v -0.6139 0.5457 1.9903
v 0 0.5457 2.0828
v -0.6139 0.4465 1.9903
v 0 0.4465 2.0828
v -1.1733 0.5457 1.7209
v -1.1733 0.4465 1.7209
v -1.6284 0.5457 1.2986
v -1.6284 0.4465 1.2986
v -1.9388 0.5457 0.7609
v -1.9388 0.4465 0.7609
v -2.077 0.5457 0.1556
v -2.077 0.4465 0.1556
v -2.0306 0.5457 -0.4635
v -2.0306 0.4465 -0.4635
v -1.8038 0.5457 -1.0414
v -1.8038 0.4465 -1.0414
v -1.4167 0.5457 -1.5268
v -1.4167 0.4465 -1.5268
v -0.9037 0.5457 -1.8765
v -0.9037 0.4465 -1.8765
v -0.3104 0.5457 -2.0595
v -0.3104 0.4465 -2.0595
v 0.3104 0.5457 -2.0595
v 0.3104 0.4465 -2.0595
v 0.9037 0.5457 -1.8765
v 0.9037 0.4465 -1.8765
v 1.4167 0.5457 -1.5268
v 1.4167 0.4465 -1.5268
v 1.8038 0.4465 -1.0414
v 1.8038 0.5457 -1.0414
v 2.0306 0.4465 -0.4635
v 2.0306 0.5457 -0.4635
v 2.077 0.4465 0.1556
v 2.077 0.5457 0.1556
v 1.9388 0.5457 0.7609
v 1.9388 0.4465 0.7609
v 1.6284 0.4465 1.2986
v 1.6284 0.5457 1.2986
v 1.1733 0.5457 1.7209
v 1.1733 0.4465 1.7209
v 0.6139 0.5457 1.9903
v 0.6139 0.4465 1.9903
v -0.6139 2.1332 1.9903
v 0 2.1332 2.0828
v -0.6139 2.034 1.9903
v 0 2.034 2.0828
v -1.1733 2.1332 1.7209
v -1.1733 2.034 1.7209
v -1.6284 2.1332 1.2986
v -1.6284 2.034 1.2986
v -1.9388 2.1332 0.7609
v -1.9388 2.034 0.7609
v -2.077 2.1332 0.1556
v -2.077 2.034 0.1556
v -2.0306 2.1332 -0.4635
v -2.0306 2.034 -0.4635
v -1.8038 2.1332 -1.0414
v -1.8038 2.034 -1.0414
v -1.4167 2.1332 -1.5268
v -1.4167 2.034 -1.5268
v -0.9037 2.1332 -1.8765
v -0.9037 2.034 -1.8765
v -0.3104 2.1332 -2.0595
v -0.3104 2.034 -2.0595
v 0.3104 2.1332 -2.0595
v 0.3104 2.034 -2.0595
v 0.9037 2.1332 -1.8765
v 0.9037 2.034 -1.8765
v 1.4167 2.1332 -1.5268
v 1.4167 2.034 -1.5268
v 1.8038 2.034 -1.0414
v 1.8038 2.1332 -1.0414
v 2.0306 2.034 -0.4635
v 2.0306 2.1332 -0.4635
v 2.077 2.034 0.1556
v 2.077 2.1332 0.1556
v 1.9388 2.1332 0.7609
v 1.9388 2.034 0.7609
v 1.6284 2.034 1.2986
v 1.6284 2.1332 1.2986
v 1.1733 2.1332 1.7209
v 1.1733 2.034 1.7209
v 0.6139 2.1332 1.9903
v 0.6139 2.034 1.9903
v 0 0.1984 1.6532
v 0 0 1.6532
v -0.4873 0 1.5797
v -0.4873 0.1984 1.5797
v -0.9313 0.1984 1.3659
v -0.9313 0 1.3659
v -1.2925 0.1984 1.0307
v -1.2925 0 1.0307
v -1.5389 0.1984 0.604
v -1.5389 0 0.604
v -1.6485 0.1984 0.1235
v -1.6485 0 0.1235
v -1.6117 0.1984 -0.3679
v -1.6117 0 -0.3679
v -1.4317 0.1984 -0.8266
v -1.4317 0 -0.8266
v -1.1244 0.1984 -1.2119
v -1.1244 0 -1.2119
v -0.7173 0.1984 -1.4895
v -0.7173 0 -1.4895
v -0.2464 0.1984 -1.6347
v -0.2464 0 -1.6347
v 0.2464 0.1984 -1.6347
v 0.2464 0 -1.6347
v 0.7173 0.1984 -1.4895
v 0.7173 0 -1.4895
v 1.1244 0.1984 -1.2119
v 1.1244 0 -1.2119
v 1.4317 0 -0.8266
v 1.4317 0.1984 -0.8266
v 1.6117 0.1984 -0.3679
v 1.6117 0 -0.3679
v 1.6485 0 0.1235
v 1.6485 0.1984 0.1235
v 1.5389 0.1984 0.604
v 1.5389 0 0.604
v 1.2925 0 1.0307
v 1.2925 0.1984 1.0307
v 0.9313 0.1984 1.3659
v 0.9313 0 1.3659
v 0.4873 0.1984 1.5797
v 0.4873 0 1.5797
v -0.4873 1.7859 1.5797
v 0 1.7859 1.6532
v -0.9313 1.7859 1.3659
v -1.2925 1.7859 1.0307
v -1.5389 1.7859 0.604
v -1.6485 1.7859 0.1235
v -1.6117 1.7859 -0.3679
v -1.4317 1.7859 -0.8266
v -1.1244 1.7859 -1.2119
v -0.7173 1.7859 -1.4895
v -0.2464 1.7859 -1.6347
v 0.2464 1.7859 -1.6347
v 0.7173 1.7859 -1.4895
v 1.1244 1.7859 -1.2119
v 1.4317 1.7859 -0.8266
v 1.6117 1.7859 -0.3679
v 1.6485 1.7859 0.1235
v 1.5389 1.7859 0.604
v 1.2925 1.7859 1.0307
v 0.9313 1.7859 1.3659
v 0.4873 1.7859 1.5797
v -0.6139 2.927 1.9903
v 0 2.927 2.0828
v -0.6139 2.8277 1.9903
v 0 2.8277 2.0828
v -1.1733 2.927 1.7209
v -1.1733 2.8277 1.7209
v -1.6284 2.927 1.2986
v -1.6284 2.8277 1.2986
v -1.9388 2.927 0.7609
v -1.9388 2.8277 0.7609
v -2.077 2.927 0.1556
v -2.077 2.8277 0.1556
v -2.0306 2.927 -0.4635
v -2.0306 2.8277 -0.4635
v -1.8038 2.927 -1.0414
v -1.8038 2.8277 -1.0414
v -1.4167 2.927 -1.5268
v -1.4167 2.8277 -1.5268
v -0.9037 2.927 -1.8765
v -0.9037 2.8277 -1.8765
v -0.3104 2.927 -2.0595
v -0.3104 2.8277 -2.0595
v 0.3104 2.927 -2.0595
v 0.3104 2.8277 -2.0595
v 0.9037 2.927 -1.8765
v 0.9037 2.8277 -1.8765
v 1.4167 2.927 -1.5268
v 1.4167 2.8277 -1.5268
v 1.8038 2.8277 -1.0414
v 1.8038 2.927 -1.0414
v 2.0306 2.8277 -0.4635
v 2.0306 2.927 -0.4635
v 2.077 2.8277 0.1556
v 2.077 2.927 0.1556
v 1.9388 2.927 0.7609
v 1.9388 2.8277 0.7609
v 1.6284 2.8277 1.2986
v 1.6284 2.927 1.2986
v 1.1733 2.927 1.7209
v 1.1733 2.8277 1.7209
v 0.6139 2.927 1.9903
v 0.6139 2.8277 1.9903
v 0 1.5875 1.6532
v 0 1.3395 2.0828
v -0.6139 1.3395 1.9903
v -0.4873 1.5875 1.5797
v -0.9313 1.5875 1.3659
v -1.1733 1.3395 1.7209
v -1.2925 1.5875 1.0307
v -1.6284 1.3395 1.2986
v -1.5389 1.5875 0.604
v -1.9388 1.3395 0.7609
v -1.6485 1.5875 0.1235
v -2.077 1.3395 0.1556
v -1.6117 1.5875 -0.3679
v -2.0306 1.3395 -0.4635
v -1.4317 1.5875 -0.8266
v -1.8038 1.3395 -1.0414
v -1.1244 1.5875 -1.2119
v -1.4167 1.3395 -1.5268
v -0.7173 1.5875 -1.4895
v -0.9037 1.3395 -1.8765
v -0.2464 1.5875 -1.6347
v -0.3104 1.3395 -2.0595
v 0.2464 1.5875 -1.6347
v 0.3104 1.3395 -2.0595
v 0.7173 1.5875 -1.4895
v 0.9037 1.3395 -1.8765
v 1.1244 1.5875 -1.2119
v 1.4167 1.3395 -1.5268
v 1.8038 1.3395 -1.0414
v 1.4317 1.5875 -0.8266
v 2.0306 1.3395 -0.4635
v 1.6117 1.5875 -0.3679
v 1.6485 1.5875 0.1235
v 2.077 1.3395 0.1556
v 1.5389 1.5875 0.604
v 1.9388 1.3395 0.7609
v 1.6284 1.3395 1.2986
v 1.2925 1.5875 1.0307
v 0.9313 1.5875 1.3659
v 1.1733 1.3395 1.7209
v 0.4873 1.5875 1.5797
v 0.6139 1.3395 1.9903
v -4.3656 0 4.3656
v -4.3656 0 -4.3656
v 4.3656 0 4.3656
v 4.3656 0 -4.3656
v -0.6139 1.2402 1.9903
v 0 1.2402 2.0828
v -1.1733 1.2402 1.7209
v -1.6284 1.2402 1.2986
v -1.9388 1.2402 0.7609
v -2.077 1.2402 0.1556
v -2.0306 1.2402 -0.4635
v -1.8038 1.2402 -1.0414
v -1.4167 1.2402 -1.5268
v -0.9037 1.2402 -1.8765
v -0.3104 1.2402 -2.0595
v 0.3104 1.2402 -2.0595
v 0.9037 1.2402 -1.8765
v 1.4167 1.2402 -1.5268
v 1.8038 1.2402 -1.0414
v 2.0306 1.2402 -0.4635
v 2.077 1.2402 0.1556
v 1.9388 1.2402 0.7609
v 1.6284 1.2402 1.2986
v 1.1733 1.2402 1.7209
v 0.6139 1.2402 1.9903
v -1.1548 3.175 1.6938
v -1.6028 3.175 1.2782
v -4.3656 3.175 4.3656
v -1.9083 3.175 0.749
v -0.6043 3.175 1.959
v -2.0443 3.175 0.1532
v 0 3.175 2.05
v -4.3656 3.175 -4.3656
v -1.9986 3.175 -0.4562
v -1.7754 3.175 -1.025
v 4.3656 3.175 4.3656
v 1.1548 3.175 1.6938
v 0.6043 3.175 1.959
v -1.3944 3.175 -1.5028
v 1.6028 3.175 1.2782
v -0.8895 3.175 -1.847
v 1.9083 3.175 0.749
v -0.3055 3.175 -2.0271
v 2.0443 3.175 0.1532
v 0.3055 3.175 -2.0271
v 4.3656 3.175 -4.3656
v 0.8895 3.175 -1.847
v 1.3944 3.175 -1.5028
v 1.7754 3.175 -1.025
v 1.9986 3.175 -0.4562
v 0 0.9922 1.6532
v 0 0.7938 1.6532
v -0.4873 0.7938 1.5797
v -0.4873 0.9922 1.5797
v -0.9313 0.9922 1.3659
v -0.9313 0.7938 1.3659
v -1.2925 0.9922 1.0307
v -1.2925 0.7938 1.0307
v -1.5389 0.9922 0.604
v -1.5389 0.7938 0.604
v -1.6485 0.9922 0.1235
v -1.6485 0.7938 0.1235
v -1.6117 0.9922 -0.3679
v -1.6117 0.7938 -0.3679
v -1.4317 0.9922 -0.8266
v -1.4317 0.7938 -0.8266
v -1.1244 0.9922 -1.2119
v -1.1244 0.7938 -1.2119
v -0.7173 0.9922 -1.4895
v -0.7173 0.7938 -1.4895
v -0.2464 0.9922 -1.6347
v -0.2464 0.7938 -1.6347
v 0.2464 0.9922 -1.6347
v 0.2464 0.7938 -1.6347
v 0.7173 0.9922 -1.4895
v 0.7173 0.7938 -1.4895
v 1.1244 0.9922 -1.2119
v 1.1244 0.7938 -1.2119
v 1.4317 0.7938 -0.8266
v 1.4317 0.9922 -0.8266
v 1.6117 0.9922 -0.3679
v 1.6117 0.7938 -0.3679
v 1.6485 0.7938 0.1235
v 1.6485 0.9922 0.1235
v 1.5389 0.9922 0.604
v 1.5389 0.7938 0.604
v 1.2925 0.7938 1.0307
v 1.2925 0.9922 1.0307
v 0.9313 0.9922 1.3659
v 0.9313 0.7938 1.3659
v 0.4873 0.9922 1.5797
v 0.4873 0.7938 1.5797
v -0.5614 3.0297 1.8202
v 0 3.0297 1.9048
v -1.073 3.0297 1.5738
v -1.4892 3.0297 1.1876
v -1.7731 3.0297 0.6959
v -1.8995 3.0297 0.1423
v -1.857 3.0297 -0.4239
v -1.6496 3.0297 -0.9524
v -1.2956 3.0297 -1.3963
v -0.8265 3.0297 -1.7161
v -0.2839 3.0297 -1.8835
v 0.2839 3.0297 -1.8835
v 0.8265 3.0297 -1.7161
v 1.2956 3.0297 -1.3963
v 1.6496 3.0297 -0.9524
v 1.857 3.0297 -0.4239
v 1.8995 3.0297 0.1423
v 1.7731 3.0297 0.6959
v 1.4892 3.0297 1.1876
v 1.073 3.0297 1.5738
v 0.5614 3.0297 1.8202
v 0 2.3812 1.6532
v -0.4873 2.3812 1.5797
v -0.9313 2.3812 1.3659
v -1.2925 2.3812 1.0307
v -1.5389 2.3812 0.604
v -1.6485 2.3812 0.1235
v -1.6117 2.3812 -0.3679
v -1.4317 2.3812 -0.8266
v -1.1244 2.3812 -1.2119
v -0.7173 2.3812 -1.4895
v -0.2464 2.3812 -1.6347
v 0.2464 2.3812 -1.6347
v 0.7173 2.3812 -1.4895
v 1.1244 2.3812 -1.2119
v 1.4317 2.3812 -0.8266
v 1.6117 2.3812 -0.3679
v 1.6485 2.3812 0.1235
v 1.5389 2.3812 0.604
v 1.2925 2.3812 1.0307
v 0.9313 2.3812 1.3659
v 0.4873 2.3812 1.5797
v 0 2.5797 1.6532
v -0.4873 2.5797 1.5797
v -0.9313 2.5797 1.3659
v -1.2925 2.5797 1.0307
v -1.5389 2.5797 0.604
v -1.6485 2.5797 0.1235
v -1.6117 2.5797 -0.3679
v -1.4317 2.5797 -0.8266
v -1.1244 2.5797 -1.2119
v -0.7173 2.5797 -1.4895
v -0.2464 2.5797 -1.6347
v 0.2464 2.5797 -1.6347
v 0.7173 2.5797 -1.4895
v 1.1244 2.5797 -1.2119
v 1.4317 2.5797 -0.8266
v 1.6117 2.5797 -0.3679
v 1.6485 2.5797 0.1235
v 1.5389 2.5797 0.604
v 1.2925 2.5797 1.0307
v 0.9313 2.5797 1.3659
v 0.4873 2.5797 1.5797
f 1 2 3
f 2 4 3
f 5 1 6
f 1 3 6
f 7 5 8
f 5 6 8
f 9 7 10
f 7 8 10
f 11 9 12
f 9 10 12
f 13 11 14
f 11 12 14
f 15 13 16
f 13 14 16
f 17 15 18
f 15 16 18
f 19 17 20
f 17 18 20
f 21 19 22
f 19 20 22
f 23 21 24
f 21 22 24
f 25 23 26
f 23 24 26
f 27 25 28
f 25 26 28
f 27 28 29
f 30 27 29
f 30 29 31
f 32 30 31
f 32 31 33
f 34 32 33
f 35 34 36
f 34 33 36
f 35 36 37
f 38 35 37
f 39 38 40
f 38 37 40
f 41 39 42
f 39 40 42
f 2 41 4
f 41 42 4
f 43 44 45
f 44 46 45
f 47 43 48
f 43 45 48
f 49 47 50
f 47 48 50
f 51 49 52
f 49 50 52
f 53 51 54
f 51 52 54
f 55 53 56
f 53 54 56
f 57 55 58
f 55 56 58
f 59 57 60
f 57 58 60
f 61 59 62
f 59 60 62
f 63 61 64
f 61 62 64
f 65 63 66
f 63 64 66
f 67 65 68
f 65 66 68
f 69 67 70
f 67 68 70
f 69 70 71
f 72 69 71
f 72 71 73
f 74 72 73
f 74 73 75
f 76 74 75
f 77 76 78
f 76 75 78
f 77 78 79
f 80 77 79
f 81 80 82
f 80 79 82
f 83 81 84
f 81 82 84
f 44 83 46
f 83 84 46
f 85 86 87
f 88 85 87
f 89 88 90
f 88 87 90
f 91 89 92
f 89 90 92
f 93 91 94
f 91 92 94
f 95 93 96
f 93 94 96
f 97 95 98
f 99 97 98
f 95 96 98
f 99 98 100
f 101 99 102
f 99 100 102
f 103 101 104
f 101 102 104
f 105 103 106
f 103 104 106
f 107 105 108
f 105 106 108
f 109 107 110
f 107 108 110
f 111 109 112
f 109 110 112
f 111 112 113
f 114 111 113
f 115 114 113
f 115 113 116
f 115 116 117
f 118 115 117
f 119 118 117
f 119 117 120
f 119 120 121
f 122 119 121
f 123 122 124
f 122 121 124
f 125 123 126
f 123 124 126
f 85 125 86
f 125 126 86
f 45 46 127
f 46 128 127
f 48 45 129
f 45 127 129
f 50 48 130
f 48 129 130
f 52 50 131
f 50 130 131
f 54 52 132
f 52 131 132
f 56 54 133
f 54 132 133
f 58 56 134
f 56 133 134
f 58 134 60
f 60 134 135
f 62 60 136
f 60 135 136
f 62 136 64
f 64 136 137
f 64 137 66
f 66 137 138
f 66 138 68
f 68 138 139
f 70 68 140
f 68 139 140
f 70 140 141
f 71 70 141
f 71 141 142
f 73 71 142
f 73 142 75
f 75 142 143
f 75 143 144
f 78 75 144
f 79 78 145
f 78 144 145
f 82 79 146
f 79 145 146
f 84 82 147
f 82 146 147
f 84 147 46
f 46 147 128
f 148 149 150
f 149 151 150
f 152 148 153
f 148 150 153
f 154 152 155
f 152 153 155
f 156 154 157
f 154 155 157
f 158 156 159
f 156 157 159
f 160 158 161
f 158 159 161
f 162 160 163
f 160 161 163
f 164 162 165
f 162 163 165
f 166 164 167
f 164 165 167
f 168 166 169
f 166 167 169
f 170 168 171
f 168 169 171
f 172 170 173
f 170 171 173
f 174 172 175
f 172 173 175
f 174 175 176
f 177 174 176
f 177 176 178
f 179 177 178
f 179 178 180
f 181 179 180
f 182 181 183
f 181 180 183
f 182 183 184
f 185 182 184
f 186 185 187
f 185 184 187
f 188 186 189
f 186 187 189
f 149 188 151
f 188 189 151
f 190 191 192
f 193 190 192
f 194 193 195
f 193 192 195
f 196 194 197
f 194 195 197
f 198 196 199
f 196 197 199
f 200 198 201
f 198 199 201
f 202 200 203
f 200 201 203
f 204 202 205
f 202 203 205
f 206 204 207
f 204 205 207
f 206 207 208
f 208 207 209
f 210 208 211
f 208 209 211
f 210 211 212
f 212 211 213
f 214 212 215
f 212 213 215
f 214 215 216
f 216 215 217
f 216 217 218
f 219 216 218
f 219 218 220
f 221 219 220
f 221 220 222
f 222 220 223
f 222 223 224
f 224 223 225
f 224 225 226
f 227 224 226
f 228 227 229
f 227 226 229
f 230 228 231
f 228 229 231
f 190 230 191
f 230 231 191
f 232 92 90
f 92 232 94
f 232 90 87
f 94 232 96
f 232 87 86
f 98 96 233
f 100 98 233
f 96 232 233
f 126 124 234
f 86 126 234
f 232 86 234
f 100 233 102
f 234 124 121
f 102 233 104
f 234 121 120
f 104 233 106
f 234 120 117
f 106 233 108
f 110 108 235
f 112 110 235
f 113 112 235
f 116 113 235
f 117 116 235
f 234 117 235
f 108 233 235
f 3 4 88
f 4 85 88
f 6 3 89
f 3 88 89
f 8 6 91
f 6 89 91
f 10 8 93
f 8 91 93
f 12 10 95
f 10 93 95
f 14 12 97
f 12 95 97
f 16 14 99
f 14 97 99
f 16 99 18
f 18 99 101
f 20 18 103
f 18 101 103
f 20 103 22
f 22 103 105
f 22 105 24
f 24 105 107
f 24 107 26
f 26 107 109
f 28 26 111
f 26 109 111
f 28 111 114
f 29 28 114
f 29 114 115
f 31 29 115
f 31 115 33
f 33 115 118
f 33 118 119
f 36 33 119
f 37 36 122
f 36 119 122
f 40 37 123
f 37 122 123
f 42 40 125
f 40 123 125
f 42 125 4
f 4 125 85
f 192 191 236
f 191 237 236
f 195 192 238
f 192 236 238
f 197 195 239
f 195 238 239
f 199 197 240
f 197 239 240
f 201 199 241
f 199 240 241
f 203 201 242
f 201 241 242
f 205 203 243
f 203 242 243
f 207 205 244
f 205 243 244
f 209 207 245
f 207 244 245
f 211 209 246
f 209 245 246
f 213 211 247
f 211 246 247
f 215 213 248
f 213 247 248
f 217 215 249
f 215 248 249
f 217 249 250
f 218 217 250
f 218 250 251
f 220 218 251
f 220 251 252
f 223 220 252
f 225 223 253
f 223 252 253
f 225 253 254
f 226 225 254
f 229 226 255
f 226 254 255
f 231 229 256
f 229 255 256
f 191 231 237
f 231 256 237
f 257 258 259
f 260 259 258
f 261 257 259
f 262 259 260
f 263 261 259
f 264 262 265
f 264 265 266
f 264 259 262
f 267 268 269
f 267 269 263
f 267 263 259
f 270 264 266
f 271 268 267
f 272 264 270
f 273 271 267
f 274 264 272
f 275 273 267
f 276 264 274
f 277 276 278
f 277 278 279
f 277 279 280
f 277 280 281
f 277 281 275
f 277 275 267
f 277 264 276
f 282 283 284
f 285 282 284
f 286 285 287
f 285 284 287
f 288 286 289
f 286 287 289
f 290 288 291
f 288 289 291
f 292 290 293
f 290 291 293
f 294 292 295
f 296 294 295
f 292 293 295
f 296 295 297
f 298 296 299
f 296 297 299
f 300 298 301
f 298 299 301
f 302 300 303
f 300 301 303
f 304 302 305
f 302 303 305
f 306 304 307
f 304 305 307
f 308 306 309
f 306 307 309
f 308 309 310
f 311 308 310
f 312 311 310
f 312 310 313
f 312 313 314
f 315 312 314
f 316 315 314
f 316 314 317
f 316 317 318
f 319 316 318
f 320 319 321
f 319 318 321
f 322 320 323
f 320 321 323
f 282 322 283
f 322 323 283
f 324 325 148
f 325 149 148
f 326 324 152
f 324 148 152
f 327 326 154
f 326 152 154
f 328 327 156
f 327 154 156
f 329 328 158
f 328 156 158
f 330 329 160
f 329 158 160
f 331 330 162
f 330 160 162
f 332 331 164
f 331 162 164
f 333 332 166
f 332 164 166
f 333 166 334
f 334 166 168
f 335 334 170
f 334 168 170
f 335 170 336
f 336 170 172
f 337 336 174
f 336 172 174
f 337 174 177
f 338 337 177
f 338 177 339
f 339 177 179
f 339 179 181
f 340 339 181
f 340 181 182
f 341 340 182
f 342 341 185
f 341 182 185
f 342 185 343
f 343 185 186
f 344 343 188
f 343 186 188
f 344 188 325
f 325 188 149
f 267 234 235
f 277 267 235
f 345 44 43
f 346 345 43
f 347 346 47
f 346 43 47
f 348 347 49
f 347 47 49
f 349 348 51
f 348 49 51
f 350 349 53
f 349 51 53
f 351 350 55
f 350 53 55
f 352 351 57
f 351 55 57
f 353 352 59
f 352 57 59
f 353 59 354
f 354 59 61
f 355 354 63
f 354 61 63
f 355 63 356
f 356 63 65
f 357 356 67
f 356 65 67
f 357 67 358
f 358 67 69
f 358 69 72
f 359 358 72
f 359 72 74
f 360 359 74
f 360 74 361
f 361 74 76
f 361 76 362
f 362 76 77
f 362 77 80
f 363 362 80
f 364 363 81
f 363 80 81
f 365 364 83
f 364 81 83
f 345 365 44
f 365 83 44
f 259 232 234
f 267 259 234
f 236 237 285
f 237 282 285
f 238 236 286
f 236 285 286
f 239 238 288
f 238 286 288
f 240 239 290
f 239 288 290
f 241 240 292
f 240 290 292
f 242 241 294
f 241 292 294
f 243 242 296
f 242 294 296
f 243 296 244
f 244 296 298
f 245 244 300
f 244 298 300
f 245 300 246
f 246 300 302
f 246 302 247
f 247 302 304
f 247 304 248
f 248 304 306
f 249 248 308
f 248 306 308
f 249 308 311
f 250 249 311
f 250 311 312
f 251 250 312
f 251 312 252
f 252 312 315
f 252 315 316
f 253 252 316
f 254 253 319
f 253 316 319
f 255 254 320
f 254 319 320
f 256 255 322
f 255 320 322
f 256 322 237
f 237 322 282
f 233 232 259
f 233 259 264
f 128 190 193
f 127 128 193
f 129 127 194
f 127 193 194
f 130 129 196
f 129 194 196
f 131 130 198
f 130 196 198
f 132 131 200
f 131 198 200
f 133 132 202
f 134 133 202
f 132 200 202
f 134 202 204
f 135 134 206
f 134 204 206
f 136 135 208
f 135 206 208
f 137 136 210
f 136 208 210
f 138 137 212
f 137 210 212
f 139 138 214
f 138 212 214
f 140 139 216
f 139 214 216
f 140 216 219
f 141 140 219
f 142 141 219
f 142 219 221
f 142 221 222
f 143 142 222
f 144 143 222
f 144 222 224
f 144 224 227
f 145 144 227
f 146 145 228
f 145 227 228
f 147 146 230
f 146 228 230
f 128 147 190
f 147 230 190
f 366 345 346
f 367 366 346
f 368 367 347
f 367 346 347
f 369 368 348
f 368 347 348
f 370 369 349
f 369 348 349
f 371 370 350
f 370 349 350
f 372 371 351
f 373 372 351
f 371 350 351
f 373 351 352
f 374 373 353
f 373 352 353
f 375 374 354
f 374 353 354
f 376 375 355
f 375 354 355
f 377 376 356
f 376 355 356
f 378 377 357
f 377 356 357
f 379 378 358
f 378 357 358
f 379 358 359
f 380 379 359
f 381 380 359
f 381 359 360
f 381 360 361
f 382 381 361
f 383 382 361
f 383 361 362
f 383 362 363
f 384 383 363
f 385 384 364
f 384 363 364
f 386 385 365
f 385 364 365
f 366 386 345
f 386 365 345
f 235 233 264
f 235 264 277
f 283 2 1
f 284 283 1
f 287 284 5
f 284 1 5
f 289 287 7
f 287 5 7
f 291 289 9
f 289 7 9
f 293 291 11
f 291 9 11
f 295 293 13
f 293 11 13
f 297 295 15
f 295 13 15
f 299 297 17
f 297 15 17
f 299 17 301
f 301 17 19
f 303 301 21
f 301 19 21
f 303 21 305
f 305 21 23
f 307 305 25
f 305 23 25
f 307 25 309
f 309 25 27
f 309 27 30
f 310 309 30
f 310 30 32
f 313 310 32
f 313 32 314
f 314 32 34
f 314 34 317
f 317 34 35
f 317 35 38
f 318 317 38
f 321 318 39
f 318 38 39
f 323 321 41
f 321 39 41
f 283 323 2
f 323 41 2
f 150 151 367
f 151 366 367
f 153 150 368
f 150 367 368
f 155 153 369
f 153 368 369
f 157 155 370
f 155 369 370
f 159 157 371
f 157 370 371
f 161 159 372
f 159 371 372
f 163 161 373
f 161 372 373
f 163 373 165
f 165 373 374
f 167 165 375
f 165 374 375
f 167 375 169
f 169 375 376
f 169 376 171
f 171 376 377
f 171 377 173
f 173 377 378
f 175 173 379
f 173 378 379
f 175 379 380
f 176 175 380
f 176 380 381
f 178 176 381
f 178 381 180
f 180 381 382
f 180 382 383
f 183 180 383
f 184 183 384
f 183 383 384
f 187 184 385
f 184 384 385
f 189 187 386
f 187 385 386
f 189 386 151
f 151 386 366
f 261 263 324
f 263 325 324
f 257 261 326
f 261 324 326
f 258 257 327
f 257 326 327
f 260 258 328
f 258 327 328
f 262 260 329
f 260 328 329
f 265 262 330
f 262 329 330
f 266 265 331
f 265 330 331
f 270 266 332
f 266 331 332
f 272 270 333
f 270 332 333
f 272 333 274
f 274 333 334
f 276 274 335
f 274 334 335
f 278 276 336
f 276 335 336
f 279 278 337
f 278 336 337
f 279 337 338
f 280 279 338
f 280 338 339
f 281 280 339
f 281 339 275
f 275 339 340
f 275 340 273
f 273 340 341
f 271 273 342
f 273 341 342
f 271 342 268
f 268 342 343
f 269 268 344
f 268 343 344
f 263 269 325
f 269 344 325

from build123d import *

# Parameters (mm, degrees)
SKETCH1_W       = 8.73125
SKETCH1_H       = 8.73125
EXTRUDE1_DEPTH  = 3.175
LPATTERN2_COUNT = 5
LPATTERN2_PITCH = 0.79375
CHAMFER1_SIZE   = 0.396875
CHAMFER1_SIZE_2 = 0.290532664


with BuildPart() as part:
    # Sketch1 → Extrude1 (new body)
    with BuildSketch(Plane(origin=(0, 0, 0), x_dir=(1, 0, 0), z_dir=(0, 1, 0))):
        Rectangle(SKETCH1_W, SKETCH1_H)
    extrude(amount=EXTRUDE1_DEPTH)

    # Sketch2 → Cut-Revolve1 (revolve, cut)
    with BuildSketch(Plane.XY, mode=Mode.PRIVATE) as cut_revolve1_sk:
        Polygon((0, 3.175), (1.65317021, 3.175), (2.0828, 2.926953125), (2.0828, 2.827734375), (1.65317021, 2.5796875), (1.65317021, 2.38125), (0, 2.38125), align=None)
    cut_revolve1 = revolve(cut_revolve1_sk.sketch.rotate(Axis((0, 1.663578541, 0), (0, -1, 0)), 90), axis=Axis((0, 1.663578541, 0), (0, -1, 0)), mode=Mode.SUBTRACT)

    # LPattern2: Cut-Revolve1 ×5
    with Locations(*[(0, -i * LPATTERN2_PITCH, 0) for i in range(1, LPATTERN2_COUNT)]):
        add(cut_revolve1, mode=Mode.SUBTRACT)

    # Chamfer1
    # the kernel refuses this chamfer: 0.396875, 0.290532664 mm, written as the material it takes off along each edge
    with BuildSketch(Plane(origin=(0, 3.175, 0), x_dir=(0, 0, 1), z_dir=(1, 0, 0))) as chamfer1_piece_1:
        Polygon((1.65317021 + CHAMFER1_SIZE, 0), (1.65317021 + CHAMFER1_SIZE_2 * 0.866025404541, CHAMFER1_SIZE_2 * 0.500000000437), (1.65317021, 0), align=None)
    revolve(axis=Axis((0, 3.175, 0), (0, -1, 0)), mode=Mode.SUBTRACT)


solid = part.part
